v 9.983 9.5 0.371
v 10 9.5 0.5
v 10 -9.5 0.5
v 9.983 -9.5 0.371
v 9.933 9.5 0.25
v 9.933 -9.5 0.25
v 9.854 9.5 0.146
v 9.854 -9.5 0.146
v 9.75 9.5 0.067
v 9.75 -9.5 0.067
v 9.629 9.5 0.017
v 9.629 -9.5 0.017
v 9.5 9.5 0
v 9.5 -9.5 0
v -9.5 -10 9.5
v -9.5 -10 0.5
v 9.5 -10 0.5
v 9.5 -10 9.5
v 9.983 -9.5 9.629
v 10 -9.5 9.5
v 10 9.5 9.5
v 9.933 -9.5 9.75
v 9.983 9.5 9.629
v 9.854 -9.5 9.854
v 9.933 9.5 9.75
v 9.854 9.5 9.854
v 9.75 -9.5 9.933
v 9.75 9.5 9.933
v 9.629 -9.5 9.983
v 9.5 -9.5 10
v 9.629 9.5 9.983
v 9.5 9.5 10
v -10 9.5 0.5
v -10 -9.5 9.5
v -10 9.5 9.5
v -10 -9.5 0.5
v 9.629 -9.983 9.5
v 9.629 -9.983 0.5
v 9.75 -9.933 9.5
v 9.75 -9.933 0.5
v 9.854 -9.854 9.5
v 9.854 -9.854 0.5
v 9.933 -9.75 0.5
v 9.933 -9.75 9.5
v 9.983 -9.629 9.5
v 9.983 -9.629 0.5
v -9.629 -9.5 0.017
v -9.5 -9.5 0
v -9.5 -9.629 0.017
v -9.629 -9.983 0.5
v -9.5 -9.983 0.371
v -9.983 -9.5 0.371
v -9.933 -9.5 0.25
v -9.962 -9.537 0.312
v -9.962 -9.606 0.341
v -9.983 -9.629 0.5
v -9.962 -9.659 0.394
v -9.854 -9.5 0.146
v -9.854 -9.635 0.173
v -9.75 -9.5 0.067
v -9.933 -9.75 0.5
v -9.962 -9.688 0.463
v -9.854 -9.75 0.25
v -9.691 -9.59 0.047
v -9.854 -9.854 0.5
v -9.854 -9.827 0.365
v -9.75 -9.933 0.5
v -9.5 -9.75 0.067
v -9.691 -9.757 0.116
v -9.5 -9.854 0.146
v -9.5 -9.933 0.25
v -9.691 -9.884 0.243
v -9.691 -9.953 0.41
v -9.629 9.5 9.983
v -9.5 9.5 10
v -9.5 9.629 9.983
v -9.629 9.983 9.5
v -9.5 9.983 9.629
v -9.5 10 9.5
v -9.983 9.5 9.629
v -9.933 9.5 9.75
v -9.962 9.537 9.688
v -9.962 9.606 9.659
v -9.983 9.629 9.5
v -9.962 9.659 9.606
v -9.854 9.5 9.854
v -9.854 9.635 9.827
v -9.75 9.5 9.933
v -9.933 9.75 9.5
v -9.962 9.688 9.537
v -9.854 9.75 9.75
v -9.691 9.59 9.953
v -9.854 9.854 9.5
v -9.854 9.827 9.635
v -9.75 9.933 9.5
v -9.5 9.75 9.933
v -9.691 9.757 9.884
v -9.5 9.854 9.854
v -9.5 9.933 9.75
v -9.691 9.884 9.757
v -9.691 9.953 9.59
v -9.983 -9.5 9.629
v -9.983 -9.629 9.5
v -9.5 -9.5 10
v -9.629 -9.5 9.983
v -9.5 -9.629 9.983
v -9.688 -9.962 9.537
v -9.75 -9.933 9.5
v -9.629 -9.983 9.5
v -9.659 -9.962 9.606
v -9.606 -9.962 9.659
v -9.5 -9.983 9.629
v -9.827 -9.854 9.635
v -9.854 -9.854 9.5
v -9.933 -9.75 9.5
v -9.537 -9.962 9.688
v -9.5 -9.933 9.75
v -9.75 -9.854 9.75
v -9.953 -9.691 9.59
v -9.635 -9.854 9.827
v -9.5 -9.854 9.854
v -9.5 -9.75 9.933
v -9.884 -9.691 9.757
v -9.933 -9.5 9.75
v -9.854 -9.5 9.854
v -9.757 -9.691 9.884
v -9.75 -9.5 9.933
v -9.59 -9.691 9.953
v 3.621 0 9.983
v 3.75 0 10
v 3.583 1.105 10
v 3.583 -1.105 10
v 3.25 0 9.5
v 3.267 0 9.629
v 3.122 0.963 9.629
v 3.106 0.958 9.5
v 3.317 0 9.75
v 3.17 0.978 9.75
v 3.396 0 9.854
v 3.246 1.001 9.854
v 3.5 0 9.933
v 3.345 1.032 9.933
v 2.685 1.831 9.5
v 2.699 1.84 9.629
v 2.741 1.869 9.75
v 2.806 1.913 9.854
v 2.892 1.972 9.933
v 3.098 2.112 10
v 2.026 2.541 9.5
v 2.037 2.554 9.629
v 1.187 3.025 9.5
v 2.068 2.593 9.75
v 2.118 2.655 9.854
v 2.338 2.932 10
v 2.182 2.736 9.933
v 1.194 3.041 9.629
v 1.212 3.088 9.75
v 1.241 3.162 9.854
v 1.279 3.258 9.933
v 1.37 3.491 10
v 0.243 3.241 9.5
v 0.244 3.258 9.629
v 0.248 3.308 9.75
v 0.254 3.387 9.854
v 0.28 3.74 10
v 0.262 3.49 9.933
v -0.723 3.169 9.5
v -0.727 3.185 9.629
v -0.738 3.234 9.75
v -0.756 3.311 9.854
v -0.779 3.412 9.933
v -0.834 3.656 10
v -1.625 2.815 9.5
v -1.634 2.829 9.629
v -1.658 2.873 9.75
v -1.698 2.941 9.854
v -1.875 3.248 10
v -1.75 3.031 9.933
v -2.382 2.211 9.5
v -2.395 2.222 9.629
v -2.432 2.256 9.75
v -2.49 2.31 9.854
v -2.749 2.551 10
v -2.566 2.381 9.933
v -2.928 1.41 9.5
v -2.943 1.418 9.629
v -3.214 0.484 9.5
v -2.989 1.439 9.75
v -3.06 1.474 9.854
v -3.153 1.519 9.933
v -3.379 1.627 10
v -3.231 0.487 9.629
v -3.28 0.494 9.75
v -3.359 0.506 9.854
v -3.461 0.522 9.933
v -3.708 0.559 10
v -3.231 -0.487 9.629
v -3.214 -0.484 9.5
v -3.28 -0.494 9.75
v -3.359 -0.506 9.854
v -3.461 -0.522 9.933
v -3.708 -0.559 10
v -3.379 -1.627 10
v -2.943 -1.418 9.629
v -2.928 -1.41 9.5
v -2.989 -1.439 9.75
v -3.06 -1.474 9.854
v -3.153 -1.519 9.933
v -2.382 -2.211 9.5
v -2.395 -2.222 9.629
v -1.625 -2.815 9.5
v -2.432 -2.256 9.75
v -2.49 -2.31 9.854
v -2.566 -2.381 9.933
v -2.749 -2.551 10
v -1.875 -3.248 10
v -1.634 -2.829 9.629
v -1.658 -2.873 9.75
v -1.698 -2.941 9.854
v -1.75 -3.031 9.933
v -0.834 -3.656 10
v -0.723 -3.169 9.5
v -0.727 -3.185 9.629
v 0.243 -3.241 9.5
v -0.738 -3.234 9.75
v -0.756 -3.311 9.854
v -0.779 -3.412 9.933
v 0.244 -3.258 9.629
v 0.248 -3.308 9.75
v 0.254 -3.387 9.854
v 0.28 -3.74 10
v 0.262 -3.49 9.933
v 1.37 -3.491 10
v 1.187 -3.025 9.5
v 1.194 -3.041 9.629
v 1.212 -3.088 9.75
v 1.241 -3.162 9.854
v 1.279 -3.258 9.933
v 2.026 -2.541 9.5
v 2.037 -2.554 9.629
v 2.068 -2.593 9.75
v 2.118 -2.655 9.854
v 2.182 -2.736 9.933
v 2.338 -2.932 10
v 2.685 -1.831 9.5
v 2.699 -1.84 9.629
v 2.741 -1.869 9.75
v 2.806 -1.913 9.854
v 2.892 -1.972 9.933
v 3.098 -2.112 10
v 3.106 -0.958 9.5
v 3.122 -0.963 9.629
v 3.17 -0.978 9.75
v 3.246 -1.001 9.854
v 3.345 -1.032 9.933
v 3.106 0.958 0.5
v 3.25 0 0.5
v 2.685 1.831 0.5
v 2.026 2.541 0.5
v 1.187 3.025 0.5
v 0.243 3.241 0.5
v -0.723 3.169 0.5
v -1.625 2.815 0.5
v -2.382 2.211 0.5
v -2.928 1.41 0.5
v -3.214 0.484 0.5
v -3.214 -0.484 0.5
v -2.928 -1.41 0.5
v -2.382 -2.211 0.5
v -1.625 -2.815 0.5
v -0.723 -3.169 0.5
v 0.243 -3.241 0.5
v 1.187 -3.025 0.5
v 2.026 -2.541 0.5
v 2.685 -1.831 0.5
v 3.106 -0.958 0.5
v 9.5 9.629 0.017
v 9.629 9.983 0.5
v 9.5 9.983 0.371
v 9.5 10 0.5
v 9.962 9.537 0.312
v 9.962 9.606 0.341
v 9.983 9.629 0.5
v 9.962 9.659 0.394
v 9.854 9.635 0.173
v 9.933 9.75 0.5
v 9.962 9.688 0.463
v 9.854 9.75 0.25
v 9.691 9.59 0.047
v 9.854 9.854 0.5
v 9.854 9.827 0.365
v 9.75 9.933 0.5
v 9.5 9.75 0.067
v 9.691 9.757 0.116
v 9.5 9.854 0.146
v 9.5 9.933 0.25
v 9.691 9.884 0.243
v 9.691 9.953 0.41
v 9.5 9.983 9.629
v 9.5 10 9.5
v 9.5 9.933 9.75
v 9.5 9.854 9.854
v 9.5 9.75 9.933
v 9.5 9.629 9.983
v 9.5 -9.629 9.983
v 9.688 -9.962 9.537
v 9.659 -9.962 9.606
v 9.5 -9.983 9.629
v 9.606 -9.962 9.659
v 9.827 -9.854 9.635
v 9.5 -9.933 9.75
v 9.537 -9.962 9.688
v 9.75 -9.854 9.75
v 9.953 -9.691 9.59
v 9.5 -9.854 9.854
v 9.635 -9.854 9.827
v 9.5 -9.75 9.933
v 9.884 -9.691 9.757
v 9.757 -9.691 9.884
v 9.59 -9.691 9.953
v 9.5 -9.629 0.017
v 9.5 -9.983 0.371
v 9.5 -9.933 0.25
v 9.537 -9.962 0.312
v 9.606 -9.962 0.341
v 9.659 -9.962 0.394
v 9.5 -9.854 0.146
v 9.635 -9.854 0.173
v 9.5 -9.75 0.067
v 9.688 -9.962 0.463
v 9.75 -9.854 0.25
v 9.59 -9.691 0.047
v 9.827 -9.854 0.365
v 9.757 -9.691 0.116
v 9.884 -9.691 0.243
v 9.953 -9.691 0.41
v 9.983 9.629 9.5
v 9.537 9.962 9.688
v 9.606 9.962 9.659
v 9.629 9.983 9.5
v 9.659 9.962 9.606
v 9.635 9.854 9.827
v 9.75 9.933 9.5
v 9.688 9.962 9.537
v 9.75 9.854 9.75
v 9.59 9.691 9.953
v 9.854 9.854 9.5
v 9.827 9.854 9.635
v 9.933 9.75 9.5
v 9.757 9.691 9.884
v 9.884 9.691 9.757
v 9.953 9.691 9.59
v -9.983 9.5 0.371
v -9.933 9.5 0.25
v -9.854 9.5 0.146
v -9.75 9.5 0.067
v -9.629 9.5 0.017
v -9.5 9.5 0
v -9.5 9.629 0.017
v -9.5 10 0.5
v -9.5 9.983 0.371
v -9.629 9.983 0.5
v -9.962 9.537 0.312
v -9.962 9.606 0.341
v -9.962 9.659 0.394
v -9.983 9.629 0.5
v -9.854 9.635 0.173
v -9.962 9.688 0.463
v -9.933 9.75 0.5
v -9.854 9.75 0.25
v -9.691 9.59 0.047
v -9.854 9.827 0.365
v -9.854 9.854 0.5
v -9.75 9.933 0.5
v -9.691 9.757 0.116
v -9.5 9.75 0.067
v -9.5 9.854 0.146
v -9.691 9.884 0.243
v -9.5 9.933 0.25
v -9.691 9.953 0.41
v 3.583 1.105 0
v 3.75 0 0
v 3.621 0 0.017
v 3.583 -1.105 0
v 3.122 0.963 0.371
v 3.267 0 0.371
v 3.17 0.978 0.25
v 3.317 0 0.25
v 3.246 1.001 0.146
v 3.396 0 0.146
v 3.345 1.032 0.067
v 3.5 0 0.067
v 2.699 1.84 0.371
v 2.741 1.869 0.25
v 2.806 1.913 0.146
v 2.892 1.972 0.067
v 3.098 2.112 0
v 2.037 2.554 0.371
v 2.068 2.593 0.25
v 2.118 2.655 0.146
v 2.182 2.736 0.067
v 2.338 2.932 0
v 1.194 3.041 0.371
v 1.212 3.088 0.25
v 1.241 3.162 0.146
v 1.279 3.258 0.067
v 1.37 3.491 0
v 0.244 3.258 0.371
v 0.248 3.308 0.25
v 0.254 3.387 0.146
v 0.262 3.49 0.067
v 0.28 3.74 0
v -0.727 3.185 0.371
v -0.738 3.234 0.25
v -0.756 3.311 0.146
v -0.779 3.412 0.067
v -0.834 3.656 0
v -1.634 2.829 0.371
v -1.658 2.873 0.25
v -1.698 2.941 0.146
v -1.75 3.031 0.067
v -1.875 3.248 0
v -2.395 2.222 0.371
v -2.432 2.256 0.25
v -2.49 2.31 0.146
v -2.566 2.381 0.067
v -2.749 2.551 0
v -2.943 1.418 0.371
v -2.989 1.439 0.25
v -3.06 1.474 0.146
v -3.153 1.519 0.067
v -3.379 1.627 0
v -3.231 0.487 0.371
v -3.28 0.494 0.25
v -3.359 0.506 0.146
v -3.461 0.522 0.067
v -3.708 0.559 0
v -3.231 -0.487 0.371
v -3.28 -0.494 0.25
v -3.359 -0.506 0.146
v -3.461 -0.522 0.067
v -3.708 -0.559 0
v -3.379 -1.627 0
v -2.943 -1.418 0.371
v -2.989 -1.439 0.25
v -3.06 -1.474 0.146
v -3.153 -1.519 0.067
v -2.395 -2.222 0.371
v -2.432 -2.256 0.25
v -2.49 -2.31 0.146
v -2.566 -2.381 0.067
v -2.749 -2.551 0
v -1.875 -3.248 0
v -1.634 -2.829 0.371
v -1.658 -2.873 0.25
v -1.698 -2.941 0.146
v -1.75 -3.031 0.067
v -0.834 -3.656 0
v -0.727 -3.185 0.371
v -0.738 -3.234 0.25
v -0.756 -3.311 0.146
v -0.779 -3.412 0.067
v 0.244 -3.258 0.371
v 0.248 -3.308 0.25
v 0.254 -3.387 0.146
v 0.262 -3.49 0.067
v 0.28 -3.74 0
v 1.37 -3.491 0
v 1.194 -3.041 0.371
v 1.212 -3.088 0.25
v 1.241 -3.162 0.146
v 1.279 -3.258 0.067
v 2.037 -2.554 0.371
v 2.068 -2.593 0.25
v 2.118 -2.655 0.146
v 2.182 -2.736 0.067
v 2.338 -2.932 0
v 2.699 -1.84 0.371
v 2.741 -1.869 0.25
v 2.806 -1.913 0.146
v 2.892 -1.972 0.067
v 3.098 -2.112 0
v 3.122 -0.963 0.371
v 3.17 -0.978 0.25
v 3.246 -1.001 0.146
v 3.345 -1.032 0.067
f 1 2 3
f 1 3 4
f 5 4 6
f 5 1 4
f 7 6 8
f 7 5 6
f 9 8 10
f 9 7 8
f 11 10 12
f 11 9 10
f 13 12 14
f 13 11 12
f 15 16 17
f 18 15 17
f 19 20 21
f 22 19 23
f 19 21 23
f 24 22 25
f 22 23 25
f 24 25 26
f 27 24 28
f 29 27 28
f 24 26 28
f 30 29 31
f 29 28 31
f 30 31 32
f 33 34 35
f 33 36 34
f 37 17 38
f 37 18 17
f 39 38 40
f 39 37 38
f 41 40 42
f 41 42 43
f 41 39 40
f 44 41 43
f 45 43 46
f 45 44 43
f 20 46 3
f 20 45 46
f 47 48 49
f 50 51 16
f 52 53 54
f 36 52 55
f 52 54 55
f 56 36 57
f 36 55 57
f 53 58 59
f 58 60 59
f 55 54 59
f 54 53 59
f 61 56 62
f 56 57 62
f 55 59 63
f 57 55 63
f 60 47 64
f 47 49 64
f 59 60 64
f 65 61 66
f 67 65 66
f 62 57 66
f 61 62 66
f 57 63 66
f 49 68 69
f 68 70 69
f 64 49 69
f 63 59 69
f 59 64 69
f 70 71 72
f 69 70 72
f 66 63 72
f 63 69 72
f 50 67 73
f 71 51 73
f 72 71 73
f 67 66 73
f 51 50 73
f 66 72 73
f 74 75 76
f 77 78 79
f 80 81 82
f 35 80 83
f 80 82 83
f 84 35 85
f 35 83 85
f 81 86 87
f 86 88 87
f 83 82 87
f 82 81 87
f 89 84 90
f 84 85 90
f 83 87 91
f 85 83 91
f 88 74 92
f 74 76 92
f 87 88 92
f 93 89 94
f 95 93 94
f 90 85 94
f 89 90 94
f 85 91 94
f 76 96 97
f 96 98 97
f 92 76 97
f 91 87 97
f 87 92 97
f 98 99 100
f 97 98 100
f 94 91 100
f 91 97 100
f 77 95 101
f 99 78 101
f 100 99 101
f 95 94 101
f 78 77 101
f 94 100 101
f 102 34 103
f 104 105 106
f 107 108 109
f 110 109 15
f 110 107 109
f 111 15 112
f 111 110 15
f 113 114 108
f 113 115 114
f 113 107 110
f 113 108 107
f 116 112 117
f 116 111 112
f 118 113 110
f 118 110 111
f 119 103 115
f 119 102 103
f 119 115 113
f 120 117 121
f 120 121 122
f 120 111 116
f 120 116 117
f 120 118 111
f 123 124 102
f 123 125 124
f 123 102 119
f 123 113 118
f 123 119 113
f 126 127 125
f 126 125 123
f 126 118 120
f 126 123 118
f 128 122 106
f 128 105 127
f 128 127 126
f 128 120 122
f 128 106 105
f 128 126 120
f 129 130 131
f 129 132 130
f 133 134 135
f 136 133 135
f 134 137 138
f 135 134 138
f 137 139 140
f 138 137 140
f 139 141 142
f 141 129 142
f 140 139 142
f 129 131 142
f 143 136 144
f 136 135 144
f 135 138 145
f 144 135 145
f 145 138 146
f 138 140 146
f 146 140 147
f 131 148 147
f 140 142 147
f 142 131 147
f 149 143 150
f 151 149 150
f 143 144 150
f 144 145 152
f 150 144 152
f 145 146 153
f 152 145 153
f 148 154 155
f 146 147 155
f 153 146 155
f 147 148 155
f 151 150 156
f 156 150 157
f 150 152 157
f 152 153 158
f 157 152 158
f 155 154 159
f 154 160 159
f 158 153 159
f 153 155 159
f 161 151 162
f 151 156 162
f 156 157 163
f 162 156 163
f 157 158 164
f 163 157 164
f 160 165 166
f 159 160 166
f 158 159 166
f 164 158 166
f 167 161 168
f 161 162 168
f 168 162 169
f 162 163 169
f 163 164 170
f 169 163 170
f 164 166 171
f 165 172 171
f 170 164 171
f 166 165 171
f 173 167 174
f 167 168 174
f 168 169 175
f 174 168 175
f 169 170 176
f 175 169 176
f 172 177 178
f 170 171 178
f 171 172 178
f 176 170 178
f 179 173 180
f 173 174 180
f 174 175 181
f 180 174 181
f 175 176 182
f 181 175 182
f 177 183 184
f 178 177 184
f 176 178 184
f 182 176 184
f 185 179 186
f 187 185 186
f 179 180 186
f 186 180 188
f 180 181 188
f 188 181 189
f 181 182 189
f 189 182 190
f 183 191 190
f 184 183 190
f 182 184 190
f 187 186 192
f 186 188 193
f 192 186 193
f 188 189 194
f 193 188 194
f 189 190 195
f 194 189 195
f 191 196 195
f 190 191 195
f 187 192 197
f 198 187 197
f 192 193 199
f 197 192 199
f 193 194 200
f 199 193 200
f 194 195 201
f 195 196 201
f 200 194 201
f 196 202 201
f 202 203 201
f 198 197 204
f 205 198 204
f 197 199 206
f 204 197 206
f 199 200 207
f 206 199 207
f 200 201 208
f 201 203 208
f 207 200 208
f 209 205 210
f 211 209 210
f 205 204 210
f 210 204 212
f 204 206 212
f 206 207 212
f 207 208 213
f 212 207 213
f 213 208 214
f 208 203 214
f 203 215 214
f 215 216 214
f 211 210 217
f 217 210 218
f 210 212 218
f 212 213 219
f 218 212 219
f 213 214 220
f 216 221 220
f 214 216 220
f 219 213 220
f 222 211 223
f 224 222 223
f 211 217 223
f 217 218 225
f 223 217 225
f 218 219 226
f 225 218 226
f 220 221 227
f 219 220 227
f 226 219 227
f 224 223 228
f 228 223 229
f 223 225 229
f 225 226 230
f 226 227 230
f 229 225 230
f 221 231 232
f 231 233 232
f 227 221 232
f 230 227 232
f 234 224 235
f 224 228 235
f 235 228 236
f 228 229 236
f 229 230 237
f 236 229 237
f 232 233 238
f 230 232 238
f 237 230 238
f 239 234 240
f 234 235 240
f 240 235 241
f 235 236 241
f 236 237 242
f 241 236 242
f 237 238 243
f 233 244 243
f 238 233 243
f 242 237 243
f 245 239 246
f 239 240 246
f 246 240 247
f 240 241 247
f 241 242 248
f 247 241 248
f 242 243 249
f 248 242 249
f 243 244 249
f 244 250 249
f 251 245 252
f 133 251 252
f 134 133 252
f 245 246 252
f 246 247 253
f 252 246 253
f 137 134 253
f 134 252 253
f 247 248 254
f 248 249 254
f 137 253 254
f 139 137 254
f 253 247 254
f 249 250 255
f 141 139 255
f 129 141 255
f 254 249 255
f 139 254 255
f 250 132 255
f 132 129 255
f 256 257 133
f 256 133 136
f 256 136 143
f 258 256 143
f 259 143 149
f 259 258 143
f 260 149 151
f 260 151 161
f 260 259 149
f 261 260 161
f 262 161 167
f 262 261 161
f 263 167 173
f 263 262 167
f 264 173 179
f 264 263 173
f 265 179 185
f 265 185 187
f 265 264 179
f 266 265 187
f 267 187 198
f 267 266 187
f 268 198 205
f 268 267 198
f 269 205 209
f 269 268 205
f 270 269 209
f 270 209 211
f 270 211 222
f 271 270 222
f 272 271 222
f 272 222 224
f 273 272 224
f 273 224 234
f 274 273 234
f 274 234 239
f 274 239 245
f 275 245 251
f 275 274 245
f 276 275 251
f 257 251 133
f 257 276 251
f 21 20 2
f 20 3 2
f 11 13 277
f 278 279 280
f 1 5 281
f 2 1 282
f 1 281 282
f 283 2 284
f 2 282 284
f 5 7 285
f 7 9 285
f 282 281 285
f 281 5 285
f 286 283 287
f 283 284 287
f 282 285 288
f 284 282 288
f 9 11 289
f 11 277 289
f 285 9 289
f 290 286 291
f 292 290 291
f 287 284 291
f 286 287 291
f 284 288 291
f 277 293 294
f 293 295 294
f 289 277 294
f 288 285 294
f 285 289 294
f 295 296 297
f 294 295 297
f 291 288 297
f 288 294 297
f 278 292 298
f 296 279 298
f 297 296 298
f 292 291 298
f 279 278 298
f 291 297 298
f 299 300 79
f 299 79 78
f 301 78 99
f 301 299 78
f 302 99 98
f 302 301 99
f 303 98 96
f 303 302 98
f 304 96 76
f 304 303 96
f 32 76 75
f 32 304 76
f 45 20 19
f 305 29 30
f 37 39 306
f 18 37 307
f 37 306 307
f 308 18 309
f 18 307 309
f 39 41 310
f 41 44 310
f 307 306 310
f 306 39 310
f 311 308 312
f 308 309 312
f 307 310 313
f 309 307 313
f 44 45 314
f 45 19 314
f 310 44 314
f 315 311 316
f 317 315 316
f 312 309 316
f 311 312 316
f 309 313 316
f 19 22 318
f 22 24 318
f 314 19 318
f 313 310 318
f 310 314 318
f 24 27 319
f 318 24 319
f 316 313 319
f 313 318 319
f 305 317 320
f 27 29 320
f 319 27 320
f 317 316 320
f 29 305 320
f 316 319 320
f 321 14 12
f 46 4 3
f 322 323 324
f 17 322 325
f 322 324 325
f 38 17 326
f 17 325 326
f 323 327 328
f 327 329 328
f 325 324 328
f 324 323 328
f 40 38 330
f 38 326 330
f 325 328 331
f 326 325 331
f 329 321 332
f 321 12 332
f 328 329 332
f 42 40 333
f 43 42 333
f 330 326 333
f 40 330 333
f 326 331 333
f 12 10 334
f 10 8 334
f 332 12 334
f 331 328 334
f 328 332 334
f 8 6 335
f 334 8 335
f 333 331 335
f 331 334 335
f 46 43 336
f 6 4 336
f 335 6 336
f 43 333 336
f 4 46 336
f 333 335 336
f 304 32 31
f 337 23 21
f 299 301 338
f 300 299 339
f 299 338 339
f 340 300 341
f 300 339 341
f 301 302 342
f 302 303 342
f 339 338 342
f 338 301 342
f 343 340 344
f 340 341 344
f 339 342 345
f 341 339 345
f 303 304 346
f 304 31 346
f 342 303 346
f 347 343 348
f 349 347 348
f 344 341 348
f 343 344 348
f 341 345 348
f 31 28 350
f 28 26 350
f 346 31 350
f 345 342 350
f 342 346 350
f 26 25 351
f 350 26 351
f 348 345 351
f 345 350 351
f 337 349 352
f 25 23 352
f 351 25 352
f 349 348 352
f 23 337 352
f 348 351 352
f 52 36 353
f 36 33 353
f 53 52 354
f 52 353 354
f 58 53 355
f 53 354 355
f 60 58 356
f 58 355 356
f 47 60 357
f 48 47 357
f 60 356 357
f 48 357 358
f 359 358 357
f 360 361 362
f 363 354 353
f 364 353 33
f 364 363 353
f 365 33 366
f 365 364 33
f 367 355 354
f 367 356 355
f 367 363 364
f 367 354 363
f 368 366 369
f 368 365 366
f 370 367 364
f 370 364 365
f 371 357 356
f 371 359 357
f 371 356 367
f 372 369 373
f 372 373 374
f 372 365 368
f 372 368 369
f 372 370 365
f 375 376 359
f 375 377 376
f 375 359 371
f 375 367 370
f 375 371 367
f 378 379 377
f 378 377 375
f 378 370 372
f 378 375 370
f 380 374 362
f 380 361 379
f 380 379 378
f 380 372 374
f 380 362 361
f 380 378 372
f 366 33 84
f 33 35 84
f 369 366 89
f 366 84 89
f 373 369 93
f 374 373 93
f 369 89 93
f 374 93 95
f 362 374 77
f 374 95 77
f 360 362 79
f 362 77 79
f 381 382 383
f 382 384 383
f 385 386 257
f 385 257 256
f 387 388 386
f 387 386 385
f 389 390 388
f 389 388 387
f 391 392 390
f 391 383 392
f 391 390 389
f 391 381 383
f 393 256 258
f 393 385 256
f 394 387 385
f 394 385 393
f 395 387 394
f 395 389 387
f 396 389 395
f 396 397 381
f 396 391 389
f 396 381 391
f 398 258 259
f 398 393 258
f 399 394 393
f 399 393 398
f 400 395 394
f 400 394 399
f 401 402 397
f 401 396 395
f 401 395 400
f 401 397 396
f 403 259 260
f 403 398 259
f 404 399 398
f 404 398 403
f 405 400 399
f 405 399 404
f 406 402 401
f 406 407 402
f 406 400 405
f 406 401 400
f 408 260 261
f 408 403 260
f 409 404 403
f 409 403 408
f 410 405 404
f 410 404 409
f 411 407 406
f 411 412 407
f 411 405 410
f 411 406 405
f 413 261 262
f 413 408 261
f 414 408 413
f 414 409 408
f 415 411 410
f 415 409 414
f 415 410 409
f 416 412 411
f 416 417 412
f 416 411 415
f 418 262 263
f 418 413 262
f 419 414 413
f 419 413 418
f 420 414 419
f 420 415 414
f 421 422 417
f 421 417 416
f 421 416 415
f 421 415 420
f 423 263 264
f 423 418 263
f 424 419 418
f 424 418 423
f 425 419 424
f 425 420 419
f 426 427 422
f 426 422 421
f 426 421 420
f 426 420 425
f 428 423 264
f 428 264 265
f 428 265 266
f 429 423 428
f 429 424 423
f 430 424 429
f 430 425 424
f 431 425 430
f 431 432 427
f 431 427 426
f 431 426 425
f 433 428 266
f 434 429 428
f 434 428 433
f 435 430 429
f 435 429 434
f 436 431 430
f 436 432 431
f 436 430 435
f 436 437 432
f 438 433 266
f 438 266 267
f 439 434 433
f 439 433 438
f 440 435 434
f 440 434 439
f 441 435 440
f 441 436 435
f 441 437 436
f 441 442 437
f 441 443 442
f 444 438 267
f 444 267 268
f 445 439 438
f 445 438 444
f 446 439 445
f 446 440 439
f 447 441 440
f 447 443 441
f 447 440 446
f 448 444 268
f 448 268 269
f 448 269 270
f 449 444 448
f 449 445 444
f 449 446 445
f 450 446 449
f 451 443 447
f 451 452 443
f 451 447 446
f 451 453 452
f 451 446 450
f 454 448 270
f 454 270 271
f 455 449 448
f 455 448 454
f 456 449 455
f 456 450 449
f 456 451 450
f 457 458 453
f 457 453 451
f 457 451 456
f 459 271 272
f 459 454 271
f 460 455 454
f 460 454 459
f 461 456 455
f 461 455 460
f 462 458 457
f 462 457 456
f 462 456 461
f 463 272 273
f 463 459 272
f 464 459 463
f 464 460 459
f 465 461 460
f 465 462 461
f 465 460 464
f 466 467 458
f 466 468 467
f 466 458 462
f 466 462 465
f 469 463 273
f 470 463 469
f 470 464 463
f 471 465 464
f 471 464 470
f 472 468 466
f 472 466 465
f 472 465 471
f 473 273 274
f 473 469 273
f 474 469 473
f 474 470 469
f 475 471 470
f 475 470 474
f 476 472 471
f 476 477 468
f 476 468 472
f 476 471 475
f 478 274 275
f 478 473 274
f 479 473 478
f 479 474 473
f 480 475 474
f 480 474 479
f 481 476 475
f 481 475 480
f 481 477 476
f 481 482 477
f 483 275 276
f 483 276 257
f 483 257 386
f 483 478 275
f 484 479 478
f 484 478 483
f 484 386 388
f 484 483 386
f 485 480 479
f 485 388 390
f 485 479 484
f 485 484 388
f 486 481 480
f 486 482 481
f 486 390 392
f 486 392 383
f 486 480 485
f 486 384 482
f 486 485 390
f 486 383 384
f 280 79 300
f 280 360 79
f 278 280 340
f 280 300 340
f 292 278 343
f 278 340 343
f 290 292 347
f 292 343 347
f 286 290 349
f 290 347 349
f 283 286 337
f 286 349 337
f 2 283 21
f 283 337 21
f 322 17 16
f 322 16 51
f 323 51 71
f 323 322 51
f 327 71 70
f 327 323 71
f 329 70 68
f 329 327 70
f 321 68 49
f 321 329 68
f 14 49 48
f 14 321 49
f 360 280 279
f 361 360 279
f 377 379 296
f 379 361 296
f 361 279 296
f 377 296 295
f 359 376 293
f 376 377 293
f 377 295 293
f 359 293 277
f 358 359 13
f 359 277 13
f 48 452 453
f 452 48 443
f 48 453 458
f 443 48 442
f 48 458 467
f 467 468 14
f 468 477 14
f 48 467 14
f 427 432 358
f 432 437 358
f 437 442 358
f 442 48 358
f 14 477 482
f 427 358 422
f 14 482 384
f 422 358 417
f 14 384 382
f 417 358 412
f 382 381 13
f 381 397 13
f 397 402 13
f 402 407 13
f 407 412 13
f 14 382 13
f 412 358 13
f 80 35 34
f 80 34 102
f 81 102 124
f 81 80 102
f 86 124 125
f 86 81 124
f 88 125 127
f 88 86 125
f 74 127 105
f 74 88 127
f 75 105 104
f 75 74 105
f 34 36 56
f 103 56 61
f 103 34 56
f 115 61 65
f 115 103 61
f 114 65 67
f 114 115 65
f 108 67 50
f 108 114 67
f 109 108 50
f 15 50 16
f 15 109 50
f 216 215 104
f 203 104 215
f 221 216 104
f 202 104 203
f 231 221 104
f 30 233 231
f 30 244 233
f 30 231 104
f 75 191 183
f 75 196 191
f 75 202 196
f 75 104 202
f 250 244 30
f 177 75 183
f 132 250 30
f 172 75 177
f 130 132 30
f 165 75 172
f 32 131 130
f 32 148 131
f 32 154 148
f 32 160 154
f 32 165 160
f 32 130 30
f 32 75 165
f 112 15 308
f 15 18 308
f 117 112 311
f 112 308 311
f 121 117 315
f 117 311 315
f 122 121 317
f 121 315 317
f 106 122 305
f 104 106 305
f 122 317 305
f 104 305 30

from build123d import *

# Parameters (mm, degrees)
ESQUISSE1_W        = 20
ESQUISSE1_H        = 20
ESQUISSE1_R        = 3.25
BOSS_EXTRU_1_DEPTH = 10
CONG_1_R           = 0.5


with BuildPart() as part:
    # Esquisse1 → Boss.-Extru.1 (new body)
    with BuildSketch(Plane.XY):
        Rectangle(ESQUISSE1_W, ESQUISSE1_H)
        Circle(ESQUISSE1_R, mode=Mode.SUBTRACT)
    extrude(amount=BOSS_EXTRU_1_DEPTH)

    # Congé1
    cong_1_edges = [part.edges().sort_by_distance(p)[0] for p in [
        (-3.25, 0, 0),
        (-3.25, 0, 10),
        (10, 0, 10),
        (0, 10, 10),
        (-10, 0, 10),
        (0, 10, 0),
        (10, 0, 0),
        (0, -10, 0),
        (-10, 0, 0),
        (-10, 10, 5),
        (10, 10, 5),
        (10, -10, 5),
        (-10, -10, 5),
        (0, -10, 10),
    ]]
    fillet(cong_1_edges, radius=CONG_1_R)


solid = part.part
